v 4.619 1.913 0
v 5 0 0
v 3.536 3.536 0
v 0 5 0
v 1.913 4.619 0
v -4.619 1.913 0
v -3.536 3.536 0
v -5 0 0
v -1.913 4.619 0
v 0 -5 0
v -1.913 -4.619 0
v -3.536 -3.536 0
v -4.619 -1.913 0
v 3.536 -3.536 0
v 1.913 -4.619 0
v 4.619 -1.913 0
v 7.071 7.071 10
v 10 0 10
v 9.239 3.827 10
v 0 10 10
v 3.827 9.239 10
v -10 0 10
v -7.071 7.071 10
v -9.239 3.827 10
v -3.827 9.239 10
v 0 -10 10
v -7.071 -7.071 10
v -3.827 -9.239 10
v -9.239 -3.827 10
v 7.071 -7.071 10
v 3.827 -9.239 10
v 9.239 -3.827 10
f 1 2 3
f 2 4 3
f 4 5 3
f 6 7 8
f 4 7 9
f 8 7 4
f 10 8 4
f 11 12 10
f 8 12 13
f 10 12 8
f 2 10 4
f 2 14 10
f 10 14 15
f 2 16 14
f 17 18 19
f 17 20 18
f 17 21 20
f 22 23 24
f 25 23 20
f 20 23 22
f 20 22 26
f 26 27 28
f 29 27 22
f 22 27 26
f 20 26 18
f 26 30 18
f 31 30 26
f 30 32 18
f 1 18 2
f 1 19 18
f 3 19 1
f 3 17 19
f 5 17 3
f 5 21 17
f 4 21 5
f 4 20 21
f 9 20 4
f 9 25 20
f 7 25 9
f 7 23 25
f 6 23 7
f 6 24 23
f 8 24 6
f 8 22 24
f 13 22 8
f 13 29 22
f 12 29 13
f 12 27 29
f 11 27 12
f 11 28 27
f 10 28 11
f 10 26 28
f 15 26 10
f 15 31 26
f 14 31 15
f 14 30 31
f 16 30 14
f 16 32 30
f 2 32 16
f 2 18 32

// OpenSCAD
// Volume: 1785.8559405304488, SurfaceArea: 904.1694842606529
linear_extrude(height = 10, scale = 2)
    circle(r = 5);
